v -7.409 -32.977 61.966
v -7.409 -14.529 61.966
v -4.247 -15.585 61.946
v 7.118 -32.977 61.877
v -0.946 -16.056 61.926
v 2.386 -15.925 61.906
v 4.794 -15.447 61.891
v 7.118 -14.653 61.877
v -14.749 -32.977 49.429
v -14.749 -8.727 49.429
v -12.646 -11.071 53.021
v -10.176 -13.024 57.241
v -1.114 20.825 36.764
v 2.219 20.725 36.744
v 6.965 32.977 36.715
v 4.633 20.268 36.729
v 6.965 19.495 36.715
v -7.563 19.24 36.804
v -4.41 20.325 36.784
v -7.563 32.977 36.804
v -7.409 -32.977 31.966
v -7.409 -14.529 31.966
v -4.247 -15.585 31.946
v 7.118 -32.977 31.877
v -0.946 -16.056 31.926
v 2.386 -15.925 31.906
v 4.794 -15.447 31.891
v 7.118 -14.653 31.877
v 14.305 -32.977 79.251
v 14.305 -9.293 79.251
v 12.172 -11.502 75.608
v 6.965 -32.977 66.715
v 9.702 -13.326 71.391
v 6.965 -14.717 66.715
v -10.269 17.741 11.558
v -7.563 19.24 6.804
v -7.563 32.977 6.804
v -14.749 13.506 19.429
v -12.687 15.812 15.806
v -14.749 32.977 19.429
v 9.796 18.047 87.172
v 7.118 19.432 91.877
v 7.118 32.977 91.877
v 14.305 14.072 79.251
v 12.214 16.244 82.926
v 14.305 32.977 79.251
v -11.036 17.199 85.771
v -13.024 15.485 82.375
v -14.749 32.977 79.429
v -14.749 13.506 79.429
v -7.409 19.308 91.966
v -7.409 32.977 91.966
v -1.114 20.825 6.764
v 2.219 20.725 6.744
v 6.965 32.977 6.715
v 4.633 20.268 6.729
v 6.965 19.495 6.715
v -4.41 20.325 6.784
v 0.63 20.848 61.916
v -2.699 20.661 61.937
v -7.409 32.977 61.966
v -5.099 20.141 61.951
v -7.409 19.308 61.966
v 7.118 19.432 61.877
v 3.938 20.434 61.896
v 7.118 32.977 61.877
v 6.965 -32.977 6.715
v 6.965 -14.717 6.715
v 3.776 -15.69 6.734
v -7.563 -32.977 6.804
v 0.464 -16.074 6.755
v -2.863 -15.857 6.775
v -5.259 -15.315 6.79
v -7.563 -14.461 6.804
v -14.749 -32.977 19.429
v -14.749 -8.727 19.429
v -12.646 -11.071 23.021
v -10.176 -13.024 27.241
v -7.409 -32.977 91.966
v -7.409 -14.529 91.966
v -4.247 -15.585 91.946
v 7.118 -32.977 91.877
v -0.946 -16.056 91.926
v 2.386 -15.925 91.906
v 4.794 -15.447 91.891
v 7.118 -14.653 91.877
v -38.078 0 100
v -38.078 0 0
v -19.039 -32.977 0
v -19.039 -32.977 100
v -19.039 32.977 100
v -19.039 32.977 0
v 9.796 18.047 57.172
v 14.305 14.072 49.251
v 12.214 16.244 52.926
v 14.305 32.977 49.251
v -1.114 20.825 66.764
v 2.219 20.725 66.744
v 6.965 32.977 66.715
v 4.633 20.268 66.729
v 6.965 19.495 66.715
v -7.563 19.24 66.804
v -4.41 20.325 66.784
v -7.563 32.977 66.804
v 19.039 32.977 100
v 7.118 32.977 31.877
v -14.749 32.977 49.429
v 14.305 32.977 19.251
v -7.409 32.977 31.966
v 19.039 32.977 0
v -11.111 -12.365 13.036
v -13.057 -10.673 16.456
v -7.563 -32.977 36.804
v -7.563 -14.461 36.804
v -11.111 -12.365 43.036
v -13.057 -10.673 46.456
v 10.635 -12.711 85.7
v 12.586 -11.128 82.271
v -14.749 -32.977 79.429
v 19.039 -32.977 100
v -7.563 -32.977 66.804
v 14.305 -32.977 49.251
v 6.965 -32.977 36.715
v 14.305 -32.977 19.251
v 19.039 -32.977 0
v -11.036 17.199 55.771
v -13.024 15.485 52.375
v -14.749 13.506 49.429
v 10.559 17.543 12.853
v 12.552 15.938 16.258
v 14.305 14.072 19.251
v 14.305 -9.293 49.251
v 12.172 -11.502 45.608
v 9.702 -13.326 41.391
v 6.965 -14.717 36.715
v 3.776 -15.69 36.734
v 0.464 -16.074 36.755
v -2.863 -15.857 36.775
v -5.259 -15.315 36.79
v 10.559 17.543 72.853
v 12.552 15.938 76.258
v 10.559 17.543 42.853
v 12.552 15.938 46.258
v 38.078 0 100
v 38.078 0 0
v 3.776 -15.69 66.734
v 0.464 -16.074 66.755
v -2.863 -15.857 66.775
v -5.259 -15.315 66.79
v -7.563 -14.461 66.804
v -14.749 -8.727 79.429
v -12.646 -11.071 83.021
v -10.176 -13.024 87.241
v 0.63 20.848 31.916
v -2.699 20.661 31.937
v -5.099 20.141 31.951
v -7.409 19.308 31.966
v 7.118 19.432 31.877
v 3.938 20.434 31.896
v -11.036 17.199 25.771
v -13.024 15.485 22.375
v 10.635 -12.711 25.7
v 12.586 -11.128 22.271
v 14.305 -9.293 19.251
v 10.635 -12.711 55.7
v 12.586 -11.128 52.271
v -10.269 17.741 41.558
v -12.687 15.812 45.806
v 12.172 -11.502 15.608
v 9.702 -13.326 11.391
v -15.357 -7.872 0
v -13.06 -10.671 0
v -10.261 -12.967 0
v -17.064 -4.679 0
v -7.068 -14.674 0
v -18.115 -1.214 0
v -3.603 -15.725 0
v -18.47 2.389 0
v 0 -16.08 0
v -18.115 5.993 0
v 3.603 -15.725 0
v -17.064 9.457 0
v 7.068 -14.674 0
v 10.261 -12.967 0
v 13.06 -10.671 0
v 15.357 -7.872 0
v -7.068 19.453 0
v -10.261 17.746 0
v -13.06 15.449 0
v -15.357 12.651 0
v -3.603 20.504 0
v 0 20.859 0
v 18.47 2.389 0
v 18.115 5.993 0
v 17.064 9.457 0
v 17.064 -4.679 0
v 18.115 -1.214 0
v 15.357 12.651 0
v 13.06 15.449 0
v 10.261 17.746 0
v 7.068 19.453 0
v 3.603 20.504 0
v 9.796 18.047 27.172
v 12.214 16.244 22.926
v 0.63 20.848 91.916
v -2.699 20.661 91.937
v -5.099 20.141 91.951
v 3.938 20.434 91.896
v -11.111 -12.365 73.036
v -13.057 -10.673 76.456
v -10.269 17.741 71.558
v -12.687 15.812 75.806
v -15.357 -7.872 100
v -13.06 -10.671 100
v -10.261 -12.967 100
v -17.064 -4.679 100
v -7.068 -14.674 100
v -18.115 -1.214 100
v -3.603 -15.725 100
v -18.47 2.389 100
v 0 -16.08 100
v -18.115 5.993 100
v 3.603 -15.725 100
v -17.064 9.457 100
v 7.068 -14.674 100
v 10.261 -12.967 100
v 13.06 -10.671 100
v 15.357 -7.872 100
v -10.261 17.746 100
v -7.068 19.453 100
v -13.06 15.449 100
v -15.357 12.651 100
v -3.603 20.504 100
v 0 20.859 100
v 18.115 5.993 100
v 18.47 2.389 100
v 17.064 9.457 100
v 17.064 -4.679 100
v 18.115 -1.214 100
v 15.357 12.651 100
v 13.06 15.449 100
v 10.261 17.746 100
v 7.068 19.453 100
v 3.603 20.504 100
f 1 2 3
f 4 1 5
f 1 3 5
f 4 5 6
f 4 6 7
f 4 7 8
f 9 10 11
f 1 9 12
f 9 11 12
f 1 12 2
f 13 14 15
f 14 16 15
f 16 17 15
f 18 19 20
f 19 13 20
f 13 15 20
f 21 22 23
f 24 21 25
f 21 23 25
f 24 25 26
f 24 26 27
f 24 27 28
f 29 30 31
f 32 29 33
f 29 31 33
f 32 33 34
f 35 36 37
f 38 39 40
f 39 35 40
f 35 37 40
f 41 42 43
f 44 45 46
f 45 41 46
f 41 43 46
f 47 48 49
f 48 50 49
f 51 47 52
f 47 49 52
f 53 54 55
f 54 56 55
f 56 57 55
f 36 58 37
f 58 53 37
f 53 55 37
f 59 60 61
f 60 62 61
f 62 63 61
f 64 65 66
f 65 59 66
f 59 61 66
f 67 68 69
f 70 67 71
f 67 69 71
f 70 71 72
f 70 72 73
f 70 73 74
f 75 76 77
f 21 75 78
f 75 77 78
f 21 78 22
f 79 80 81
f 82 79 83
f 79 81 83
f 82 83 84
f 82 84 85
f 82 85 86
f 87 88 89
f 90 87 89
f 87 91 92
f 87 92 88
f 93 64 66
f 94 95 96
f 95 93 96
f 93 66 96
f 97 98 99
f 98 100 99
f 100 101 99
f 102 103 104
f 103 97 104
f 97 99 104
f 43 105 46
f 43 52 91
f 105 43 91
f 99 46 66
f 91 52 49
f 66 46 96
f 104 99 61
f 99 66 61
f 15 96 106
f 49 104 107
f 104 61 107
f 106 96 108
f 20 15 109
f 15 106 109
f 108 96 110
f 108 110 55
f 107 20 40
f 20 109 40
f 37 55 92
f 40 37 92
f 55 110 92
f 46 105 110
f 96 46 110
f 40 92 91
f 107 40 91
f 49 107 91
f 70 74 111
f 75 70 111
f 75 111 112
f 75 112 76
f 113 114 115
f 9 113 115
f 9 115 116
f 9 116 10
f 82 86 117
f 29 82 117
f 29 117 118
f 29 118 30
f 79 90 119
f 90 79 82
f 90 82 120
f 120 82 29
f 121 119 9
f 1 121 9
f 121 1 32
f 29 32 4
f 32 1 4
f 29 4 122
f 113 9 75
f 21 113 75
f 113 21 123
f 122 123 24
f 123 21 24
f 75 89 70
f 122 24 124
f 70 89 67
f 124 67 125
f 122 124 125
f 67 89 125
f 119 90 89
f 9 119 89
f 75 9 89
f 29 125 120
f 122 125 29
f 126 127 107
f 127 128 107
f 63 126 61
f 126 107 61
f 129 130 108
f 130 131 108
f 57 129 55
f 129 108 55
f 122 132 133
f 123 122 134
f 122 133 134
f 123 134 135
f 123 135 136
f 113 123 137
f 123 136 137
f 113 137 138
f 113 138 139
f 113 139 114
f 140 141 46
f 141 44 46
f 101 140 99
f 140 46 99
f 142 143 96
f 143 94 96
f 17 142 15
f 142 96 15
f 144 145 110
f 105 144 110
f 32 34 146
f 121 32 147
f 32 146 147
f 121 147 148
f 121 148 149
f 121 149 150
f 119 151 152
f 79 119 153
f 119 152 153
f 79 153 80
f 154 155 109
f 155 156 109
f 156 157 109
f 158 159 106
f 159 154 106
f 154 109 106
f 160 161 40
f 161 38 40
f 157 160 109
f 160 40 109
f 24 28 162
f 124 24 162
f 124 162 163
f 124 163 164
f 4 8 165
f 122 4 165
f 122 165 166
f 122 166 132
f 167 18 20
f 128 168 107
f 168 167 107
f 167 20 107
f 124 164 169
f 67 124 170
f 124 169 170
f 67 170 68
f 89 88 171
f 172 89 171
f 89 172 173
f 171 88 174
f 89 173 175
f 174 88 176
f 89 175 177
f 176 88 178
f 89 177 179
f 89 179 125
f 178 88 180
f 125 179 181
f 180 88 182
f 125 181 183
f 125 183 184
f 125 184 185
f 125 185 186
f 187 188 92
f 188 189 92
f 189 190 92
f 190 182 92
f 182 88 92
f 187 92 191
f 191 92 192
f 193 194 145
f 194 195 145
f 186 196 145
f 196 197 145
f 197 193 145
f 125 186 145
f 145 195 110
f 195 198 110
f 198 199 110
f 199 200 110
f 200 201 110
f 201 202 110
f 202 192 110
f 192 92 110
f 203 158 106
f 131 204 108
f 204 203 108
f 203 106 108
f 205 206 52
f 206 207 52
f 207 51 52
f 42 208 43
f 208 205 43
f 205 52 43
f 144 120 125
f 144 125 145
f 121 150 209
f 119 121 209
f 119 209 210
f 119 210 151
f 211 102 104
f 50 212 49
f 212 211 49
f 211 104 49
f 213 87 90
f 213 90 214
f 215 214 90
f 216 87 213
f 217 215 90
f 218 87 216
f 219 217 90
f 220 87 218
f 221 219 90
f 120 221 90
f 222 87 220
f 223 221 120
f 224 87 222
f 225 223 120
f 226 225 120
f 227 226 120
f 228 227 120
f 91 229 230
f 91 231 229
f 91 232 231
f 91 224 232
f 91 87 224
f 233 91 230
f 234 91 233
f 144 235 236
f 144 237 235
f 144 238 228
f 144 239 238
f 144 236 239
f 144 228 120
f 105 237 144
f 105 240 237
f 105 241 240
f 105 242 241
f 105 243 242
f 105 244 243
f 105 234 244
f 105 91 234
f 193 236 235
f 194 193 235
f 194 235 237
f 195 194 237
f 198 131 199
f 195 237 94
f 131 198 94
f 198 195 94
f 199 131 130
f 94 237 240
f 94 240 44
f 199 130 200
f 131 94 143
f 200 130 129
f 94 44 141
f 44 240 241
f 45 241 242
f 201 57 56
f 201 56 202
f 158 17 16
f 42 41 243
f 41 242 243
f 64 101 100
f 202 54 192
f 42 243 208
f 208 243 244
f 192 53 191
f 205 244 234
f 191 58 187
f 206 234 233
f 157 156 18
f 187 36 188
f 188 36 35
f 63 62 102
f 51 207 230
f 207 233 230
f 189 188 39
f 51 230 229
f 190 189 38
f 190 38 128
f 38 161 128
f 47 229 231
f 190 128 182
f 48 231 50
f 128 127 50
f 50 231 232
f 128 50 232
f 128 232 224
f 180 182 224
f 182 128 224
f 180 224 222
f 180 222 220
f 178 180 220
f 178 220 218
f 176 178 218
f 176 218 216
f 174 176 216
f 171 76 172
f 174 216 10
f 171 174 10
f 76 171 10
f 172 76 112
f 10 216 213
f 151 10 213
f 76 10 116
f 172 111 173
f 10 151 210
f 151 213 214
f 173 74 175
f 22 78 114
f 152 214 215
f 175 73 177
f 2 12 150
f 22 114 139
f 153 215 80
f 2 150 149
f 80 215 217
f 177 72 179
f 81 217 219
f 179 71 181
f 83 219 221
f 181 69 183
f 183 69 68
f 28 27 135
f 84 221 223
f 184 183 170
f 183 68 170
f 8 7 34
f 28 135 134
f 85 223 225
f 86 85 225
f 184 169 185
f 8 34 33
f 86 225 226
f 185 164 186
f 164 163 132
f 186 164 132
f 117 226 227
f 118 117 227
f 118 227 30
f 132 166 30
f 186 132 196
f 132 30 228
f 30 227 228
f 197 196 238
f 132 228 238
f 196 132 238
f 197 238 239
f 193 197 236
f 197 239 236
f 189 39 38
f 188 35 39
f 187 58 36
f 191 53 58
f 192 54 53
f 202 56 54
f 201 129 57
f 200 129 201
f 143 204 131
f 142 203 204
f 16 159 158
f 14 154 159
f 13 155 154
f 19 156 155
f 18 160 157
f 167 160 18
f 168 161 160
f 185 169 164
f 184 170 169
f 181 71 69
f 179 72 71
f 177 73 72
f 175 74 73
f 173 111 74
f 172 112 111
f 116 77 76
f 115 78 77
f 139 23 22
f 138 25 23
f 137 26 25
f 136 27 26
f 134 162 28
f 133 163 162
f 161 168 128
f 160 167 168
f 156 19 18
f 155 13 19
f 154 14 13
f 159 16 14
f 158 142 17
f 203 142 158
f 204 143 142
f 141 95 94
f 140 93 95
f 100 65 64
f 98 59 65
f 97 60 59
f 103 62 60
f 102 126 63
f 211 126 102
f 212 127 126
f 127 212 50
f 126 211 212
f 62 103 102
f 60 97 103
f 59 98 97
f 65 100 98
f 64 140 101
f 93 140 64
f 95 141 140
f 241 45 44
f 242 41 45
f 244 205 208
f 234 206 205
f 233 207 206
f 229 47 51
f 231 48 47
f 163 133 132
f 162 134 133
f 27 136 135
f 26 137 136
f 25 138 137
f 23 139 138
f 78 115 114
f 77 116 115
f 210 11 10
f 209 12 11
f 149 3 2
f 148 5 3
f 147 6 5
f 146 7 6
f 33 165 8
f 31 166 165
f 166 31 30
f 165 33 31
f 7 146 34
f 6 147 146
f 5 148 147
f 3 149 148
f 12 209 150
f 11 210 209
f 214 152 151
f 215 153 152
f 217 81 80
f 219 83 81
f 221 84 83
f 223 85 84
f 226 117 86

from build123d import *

# Parameters (mm, degrees)
EXTRUDE_1_DEPTH     = 100
SKETCH_2_R          = 18.469515879
CUT_EXTRUDE_1_DEPTH = 100
CUT_EXTRUDE_6_DEPTH = 126.697486666


with BuildPart() as part:
    # 草图1 → 凸台-拉伸1 (new body)
    with BuildSketch(Plane.XY):
        Polygon((38.078399894, 0), (19.039199947, 32.976861644), (-19.039199947, 32.976861644), (-38.078399894, 0), (-19.039199947, -32.976861644), (19.039199947, -32.976861644), align=None)
    extrude(amount=EXTRUDE_1_DEPTH)

    # 草图2 → 切除-拉伸1 (cut)
    with BuildSketch(Plane.XY.offset(100)):
        with Locations((0, 2.389391374)):
            Circle(SKETCH_2_R)
    extrude(amount=-CUT_EXTRUDE_1_DEPTH, mode=Mode.SUBTRACT)

    # 草图7 → 切除-拉伸6 (cut, through all)
    with BuildSketch(Plane(origin=(0, 32.976861644, 0), x_dir=(1, 0, 0), z_dir=(0, 1, 0))):
        Polygon((6.96455573, -36.71488632), (-7.562692597, -36.803663943), (-14.749433085, -49.429018853), (-7.408925244, -61.965596141), (7.118323083, -61.876818518), (14.305063571, -49.251463608), align=None)
        Polygon((6.96455573, -6.71488632), (-7.562692597, -6.803663943), (-14.749433085, -19.429018853), (-7.408925244, -31.965596141), (7.118323083, -31.876818518), (14.305063571, -19.251463608), align=None)
        Polygon((6.96455573, -66.71488632), (-7.562692597, -66.803663943), (-14.749433085, -79.429018853), (-7.408925244, -91.965596141), (7.118323083, -91.876818518), (14.305063571, -79.251463608), align=None)
    extrude(amount=-CUT_EXTRUDE_6_DEPTH, mode=Mode.SUBTRACT)


solid = part.part
